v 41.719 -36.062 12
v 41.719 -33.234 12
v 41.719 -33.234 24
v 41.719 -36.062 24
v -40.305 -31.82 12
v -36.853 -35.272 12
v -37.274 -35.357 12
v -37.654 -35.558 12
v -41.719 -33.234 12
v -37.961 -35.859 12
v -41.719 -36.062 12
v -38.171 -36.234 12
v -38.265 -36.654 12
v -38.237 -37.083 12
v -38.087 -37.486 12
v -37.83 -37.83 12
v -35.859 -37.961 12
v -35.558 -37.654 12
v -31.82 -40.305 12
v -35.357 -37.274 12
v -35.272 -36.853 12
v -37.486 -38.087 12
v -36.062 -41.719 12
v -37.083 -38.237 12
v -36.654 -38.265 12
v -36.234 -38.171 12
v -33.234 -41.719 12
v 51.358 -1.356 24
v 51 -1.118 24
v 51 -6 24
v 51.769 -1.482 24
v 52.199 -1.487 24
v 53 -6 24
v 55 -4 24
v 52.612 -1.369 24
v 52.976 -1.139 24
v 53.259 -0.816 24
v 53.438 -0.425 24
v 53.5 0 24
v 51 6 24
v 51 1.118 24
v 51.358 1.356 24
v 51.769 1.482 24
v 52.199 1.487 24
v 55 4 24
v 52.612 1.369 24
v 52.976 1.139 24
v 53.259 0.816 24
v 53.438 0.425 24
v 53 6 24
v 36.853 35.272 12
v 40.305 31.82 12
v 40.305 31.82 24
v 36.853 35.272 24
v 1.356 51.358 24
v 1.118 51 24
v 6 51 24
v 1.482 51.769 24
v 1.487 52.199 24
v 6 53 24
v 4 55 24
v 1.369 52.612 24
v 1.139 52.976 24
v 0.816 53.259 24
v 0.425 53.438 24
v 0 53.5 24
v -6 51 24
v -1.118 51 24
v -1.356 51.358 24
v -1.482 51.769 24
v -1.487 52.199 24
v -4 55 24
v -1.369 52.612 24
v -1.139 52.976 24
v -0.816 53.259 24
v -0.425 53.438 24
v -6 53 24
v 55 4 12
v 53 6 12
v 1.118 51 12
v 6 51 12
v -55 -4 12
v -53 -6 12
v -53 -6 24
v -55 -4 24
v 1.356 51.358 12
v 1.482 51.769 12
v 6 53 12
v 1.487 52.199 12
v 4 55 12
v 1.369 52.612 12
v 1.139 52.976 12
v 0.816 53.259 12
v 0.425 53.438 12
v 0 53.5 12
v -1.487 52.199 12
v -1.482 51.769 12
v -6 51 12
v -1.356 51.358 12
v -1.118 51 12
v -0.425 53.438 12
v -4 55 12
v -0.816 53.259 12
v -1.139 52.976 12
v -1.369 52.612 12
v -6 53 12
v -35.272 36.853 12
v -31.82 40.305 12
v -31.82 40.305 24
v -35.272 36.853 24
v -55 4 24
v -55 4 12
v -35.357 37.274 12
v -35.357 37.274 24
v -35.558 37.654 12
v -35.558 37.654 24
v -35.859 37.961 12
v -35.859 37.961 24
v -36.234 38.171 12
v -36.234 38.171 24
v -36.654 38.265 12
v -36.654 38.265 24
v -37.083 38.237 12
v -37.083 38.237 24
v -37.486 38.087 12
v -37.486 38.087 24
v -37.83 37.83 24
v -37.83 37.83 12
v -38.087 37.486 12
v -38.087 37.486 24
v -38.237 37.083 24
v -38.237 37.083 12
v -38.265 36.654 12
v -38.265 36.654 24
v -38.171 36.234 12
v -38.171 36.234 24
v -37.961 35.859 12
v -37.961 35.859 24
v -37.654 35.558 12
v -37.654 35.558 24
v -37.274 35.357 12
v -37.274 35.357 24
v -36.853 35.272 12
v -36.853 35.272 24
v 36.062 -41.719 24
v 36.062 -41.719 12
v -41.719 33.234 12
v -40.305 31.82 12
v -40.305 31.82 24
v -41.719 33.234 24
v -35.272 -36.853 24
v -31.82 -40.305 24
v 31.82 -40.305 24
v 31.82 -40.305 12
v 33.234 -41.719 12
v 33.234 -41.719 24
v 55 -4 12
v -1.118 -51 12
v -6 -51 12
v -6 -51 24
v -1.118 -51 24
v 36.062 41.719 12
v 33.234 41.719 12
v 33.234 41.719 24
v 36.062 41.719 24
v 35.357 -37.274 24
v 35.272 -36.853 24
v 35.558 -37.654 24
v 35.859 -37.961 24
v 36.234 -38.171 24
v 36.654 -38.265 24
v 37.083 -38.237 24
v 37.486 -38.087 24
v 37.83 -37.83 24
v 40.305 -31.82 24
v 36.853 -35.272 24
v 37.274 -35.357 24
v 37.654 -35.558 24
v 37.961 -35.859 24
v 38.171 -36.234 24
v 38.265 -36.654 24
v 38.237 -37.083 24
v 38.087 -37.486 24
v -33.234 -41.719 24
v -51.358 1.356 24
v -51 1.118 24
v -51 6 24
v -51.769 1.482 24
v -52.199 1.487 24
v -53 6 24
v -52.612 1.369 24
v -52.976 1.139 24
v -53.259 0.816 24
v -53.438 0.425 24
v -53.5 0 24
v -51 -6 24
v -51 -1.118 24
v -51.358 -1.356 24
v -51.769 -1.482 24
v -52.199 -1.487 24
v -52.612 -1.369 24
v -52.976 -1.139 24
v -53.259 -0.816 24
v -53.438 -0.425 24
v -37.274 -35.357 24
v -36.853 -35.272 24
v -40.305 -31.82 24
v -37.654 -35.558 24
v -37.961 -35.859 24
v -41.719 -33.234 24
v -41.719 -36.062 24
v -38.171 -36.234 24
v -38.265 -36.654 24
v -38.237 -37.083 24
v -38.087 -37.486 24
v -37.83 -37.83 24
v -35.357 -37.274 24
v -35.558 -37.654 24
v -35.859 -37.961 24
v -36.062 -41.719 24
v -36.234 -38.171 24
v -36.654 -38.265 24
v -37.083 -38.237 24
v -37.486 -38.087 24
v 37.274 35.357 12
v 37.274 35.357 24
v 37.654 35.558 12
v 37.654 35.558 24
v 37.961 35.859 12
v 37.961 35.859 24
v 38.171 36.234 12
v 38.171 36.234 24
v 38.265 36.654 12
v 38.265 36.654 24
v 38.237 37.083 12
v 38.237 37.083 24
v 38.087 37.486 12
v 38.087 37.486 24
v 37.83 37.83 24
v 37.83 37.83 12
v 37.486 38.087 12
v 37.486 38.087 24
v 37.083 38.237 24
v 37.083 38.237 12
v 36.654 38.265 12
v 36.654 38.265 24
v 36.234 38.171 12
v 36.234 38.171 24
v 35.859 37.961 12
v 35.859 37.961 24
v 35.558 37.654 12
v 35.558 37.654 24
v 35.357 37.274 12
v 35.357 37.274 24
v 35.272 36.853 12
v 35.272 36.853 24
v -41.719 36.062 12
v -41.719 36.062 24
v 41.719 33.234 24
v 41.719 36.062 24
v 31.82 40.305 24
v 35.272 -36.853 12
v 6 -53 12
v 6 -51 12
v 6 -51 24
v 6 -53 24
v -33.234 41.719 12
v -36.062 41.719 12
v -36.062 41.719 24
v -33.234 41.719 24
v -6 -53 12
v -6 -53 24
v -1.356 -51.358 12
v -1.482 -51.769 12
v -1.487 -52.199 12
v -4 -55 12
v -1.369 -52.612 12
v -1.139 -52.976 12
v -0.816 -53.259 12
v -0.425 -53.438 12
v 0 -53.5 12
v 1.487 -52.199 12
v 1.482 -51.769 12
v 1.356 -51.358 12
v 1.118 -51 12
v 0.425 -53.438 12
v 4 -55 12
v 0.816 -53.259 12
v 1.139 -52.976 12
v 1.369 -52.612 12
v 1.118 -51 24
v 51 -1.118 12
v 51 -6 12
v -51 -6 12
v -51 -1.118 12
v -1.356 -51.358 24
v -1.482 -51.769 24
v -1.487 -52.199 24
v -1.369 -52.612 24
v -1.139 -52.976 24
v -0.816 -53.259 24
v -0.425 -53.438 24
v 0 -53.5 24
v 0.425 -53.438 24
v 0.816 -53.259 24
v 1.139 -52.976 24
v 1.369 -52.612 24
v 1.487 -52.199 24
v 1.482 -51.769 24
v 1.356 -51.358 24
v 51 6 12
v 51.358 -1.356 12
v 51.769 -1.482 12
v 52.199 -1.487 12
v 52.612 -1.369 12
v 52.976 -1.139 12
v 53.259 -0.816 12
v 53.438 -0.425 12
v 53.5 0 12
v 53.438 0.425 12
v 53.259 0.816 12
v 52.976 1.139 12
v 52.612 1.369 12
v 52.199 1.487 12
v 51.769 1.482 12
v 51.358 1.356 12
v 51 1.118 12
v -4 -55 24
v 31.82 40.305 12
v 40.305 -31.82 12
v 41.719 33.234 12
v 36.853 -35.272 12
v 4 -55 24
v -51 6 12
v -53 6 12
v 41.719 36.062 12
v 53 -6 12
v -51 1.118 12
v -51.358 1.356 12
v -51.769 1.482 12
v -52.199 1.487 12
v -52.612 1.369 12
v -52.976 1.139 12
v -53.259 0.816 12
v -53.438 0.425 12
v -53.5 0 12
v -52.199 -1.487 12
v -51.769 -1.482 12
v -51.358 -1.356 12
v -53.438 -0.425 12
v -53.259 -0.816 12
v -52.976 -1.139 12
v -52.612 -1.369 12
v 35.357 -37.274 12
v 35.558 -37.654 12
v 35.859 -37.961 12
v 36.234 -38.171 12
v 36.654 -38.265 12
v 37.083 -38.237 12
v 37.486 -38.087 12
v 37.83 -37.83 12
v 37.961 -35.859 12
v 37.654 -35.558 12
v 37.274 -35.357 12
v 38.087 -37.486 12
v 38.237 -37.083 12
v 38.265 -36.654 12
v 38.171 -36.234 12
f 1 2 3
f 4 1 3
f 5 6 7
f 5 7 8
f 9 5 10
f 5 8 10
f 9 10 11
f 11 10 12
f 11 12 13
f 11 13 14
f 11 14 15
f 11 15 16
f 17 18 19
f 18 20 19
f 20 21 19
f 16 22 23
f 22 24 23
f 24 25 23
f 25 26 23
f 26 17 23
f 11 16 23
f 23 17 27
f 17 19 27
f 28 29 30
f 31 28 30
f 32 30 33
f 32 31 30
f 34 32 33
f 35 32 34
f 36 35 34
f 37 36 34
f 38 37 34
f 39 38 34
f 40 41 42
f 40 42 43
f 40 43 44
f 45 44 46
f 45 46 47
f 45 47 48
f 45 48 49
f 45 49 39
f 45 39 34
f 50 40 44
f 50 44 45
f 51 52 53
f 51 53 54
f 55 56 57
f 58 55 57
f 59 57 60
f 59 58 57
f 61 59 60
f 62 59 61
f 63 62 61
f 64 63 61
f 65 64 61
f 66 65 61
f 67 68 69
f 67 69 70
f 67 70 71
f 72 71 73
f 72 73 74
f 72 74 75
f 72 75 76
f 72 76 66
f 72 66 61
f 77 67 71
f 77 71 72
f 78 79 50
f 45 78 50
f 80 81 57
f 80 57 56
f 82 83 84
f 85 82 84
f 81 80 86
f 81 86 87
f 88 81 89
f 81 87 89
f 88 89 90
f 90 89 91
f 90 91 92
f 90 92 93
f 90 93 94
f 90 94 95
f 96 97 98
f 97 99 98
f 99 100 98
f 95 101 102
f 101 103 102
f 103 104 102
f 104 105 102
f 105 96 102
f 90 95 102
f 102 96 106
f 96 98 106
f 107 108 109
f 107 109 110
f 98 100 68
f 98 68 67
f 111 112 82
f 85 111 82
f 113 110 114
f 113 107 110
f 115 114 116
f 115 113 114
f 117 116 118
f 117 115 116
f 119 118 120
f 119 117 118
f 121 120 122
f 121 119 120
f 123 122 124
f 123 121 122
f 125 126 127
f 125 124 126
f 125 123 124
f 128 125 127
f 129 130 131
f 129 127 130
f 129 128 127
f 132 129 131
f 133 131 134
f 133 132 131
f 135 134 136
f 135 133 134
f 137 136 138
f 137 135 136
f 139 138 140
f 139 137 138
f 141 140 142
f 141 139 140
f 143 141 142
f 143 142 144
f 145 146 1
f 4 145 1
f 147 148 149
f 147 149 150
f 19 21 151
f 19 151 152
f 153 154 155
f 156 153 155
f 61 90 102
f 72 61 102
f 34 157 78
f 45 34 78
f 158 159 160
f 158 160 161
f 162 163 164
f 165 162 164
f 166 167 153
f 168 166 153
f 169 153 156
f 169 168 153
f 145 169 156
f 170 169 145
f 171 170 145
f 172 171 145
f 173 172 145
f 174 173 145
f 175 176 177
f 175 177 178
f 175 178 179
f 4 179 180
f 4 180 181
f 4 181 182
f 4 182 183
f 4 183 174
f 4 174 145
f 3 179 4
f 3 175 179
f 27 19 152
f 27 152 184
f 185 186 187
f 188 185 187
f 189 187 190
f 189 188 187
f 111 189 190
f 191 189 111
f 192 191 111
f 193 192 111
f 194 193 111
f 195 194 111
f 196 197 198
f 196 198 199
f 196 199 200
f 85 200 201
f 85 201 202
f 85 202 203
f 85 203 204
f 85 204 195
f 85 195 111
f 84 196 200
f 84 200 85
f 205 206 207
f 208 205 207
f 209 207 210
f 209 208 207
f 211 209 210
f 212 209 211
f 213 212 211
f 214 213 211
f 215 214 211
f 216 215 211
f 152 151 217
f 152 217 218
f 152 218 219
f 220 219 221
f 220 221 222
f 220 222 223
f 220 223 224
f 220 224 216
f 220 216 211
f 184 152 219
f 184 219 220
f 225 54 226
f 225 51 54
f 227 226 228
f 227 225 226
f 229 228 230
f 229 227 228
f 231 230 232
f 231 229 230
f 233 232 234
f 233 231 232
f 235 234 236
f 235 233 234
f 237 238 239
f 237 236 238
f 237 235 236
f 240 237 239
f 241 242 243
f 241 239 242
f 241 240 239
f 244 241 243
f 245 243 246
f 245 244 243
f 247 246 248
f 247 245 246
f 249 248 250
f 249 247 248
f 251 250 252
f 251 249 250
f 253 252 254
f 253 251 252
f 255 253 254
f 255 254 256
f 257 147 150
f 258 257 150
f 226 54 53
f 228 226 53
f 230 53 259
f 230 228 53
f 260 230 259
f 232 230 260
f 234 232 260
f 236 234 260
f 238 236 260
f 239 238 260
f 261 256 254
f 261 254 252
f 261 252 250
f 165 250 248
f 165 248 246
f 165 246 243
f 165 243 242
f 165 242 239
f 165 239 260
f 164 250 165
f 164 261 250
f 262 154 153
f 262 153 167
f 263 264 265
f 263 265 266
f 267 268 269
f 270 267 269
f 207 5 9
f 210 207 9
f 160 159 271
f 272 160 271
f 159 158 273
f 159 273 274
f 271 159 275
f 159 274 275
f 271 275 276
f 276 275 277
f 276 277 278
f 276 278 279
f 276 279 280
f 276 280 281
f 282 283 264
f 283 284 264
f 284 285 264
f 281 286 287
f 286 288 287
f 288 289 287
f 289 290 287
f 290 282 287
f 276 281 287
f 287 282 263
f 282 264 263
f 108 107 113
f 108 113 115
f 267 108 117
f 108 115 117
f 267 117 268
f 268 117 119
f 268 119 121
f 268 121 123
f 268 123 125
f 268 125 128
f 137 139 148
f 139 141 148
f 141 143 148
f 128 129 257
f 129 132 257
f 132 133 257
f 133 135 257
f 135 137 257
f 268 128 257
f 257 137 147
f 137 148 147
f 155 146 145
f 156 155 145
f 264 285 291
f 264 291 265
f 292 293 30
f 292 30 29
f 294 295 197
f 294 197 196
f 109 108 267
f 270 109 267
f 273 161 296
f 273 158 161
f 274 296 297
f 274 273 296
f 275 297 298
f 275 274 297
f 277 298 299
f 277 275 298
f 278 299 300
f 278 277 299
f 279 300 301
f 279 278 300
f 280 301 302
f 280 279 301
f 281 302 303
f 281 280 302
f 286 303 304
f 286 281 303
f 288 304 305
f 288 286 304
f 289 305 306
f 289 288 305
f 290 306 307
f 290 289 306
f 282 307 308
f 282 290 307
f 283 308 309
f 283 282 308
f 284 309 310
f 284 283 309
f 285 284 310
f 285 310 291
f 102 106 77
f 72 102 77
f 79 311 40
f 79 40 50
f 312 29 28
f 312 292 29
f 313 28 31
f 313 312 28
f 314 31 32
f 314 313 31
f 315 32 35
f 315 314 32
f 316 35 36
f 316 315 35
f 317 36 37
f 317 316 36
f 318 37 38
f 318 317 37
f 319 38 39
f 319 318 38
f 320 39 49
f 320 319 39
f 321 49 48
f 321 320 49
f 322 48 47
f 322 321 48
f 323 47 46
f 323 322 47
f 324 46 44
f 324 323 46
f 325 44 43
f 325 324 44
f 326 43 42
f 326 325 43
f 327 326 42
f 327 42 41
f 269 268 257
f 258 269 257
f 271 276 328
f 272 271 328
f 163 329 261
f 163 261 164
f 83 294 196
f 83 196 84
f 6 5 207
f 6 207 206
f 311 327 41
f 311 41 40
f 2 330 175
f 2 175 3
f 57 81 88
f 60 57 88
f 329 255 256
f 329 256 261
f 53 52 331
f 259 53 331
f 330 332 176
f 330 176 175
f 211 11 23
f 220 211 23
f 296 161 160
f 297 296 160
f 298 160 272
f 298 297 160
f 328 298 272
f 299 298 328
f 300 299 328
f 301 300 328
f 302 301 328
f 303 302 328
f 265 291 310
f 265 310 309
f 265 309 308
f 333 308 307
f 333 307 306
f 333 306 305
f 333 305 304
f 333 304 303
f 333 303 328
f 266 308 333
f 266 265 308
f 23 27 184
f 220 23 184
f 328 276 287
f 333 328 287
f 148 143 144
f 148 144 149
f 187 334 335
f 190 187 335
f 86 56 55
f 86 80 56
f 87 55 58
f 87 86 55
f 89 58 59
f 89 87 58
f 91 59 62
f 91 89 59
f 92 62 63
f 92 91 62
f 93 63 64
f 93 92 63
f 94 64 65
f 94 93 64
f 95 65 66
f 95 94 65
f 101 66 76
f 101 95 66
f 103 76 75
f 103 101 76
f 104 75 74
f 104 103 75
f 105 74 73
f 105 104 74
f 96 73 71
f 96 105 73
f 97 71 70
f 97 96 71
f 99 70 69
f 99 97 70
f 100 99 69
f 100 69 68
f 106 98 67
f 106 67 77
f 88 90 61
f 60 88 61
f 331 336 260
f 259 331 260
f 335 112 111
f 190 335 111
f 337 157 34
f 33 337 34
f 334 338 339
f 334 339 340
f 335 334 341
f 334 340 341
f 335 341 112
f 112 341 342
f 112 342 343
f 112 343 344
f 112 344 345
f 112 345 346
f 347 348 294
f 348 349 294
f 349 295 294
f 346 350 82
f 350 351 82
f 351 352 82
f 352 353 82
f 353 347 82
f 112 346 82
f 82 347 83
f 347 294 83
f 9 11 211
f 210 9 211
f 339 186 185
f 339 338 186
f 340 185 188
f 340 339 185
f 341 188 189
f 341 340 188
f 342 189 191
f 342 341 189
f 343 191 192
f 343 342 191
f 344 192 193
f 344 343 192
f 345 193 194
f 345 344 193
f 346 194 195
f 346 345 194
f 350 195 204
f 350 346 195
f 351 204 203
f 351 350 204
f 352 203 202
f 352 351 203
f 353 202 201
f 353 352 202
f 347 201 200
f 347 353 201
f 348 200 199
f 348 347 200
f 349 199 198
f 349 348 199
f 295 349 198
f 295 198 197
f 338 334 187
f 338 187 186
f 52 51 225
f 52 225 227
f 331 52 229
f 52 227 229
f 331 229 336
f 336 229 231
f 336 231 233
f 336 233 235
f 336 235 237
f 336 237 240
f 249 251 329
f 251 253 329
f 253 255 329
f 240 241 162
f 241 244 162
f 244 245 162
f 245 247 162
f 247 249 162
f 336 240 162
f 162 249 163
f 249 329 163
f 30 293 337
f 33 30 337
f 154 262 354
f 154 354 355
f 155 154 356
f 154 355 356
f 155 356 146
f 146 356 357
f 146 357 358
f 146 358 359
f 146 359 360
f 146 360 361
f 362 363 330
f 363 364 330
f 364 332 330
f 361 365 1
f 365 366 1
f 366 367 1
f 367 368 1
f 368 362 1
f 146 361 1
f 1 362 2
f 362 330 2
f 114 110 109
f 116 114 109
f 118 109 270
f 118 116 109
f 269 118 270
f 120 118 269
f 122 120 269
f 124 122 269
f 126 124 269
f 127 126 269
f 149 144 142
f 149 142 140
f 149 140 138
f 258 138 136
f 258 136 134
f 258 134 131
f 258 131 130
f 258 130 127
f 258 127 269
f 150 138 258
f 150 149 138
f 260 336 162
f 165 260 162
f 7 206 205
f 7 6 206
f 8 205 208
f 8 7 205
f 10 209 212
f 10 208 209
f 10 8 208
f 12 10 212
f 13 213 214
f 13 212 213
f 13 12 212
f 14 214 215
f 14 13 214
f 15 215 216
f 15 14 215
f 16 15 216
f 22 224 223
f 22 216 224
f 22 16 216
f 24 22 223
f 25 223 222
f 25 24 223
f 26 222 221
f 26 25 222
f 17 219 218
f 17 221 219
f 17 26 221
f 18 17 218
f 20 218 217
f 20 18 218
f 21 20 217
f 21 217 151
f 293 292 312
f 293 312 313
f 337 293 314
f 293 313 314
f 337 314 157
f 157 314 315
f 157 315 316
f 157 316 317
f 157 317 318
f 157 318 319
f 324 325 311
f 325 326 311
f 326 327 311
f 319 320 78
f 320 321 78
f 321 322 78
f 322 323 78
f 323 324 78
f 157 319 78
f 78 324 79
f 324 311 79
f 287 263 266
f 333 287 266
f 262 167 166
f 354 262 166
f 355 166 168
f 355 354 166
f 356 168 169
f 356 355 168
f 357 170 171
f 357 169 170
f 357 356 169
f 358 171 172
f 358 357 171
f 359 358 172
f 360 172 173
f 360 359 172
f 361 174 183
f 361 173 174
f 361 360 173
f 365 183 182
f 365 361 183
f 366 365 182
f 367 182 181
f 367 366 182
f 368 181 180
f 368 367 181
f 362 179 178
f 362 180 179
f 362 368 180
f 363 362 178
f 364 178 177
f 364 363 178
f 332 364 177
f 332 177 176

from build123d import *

# Parameters (mm, degrees)
CYLINDER1215_R               = 1.5
CYLINDER1215_DEPTH           = 50
CYLINDER1215_PLACEMENT_ANGLE = 45
CYLINDER1213_R               = 1.5
CYLINDER1213_DEPTH           = 50
CYLINDER1220_R               = 1.5
CYLINDER1220_DEPTH           = 50
CYLINDER1220_PLACEMENT_ANGLE = 135
CYLINDER1216_R               = 1.5
CYLINDER1216_DEPTH           = 50
CYLINDER1217_R               = 1.5
CYLINDER1217_DEPTH           = 50
CYLINDER1217_PLACEMENT_ANGLE = 225
CYLINDER1218_R               = 1.5
CYLINDER1218_DEPTH           = 50
CYLINDER1219_R               = 1.5
CYLINDER1219_DEPTH           = 50
CYLINDER1219_PLACEMENT_ANGLE = 45
CYLINDER1214_R               = 1.5
CYLINDER1214_DEPTH           = 50
BOX511_W                     = 4
BOX511_H                     = 12
BOX511_DEPTH                 = 12
CHAMFER018_SIZE              = 2
CHAMFER018_PLACEMENT_ANGLE   = 45
CHAMFER019_SIZE              = 2
CHAMFER019_PLACEMENT_ANGLE   = 90
CHAMFER020_SIZE              = 2
CHAMFER020_PLACEMENT_ANGLE   = 135
CHAMFER021_SIZE              = 2
CHAMFER021_PLACEMENT_ANGLE   = 180
CHAMFER022_SIZE              = 2
CHAMFER022_PLACEMENT_ANGLE   = 225
CHAMFER023_SIZE              = 2
CHAMFER023_PLACEMENT_ANGLE   = 90
CHAMFER024_SIZE              = 2
CHAMFER024_PLACEMENT_ANGLE   = 45
CHAMFER017_SIZE              = 2


with BuildPart() as v_lec1215:
    # Cylinder1215 → Cylinder1215 (new body)
    with BuildSketch(Plane.XY):
        Circle(CYLINDER1215_R)
    extrude(amount=CYLINDER1215_DEPTH)


with BuildPart() as v_lec1215_1:
    # Cylinder1215 placement: moved
    add(v_lec1215.part.moved(Location((36.769553, 36.769553, 0))).rotate(Axis((36.769553, 36.769553, 0), (0, 0, 1)), CYLINDER1215_PLACEMENT_ANGLE))


with BuildPart() as v_lec1213:
    # Cylinder1213 → Cylinder1213 (new body)
    with BuildSketch(Plane(origin=(0, 52, 0), x_dir=(0, 1, 0), z_dir=(0, 0, 1))):
        Circle(CYLINDER1213_R)
    extrude(amount=CYLINDER1213_DEPTH)


with BuildPart() as v_lec1220:
    # Cylinder1220 → Cylinder1220 (new body)
    with BuildSketch(Plane.XY):
        Circle(CYLINDER1220_R)
    extrude(amount=CYLINDER1220_DEPTH)


with BuildPart() as v_lec1220_1:
    # Cylinder1220 placement: moved
    add(v_lec1220.part.moved(Location((-36.769553, 36.769553, 0))).rotate(Axis((-36.769553, 36.769553, 0), (0, 0, 1)), CYLINDER1220_PLACEMENT_ANGLE))


with BuildPart() as v_lec1216:
    # Cylinder1216 → Cylinder1216 (new body)
    with BuildSketch(Plane(origin=(-52, 0, 0), x_dir=(-1, 0, 0), z_dir=(0, 0, 1))):
        Circle(CYLINDER1216_R)
    extrude(amount=CYLINDER1216_DEPTH)


with BuildPart() as v_lec1217:
    # Cylinder1217 → Cylinder1217 (new body)
    with BuildSketch(Plane.XY):
        Circle(CYLINDER1217_R)
    extrude(amount=CYLINDER1217_DEPTH)


with BuildPart() as v_lec1217_1:
    # Cylinder1217 placement: moved
    add(v_lec1217.part.moved(Location((-36.769553, -36.769553, 0))).rotate(Axis((-36.769553, -36.769553, 0), (0, 0, 1)), CYLINDER1217_PLACEMENT_ANGLE))


with BuildPart() as v_lec1218:
    # Cylinder1218 → Cylinder1218 (new body)
    with BuildSketch(Plane(origin=(0, -52, 0), x_dir=(0, -1, 0), z_dir=(0, 0, 1))):
        Circle(CYLINDER1218_R)
    extrude(amount=CYLINDER1218_DEPTH)


with BuildPart() as v_lec1219:
    # Cylinder1219 → Cylinder1219 (new body)
    with BuildSketch(Plane.XY):
        Circle(CYLINDER1219_R)
    extrude(amount=CYLINDER1219_DEPTH)


with BuildPart() as v_lec1219_1:
    # Cylinder1219 placement: moved
    add(v_lec1219.part.moved(Location((36.769553, -36.769553, 0))).rotate(Axis((36.769553, -36.769553, 0), (0, 0, -1)), CYLINDER1219_PLACEMENT_ANGLE))


with BuildPart() as compound899:
    # Cylinder1214 → Cylinder1214 (new body)
    with BuildSketch(Plane(origin=(52, 0, 0), x_dir=(1, 0, 0), z_dir=(0, 0, 1))):
        Circle(CYLINDER1214_R)
    extrude(amount=CYLINDER1214_DEPTH)

    # Compound899: union Válec1215, Válec1213, Válec1220, Válec1216, Válec1217, Válec1218, Válec1219
    add(v_lec1215_1.part)
    add(v_lec1213.part)
    add(v_lec1220_1.part)
    add(v_lec1216.part)
    add(v_lec1217_1.part)
    add(v_lec1218.part)
    add(v_lec1219_1.part)


with BuildPart() as compound899_1:
    # Compound899 placement: moved
    add(compound899.part.moved(Location((0, 0, -7))))


with BuildPart() as krychle511:
    # Box511 → Box511 (new body)
    with BuildSketch(Plane(origin=(51, -6, 12), x_dir=(1, 0, 0), z_dir=(0, 0, 1))):
        with Locations((2, 6)):
            Rectangle(BOX511_W, BOX511_H)
    extrude(amount=BOX511_DEPTH)


with BuildPart() as chamfer018:
    # Chamfer018 base: copy of Krychle511
    add(krychle511.part)

    # Chamfer018
    chamfer018_edges = [chamfer018.edges().sort_by_distance(p)[0] for p in [
        (55, -6, 18),
        (55, 6, 18),
    ]]
    chamfer(chamfer018_edges, length=CHAMFER018_SIZE)


with BuildPart() as chamfer018_1:
    # Chamfer018 placement: moved
    add(chamfer018.part.rotate(Axis((0, 0, 0), (0, 0, 1)), CHAMFER018_PLACEMENT_ANGLE))


with BuildPart() as chamfer019:
    # Chamfer019 base: copy of Krychle511
    add(krychle511.part)

    # Chamfer019
    chamfer019_edges = [chamfer019.edges().sort_by_distance(p)[0] for p in [
        (55, -6, 18),
        (55, 6, 18),
    ]]
    chamfer(chamfer019_edges, length=CHAMFER019_SIZE)


with BuildPart() as chamfer019_1:
    # Chamfer019 placement: moved
    add(chamfer019.part.rotate(Axis((0, 0, 0), (0, 0, 1)), CHAMFER019_PLACEMENT_ANGLE))


with BuildPart() as chamfer020:
    # Chamfer020 base: copy of Krychle511
    add(krychle511.part)

    # Chamfer020
    chamfer020_edges = [chamfer020.edges().sort_by_distance(p)[0] for p in [
        (55, -6, 18),
        (55, 6, 18),
    ]]
    chamfer(chamfer020_edges, length=CHAMFER020_SIZE)


with BuildPart() as chamfer020_1:
    # Chamfer020 placement: moved
    add(chamfer020.part.rotate(Axis((0, 0, 0), (0, 0, 1)), CHAMFER020_PLACEMENT_ANGLE))


with BuildPart() as chamfer021:
    # Chamfer021 base: copy of Krychle511
    add(krychle511.part)

    # Chamfer021
    chamfer021_edges = [chamfer021.edges().sort_by_distance(p)[0] for p in [
        (55, -6, 18),
        (55, 6, 18),
    ]]
    chamfer(chamfer021_edges, length=CHAMFER021_SIZE)


with BuildPart() as chamfer021_1:
    # Chamfer021 placement: moved
    add(chamfer021.part.rotate(Axis((0, 0, 0), (0, 0, 1)), CHAMFER021_PLACEMENT_ANGLE))


with BuildPart() as chamfer022:
    # Chamfer022 base: copy of Krychle511
    add(krychle511.part)

    # Chamfer022
    chamfer022_edges = [chamfer022.edges().sort_by_distance(p)[0] for p in [
        (55, -6, 18),
        (55, 6, 18),
    ]]
    chamfer(chamfer022_edges, length=CHAMFER022_SIZE)


with BuildPart() as chamfer022_1:
    # Chamfer022 placement: moved
    add(chamfer022.part.rotate(Axis((0, 0, 0), (0, 0, 1)), CHAMFER022_PLACEMENT_ANGLE))


with BuildPart() as chamfer023:
    # Chamfer023 base: copy of Krychle511
    add(krychle511.part)

    # Chamfer023
    chamfer023_edges = [chamfer023.edges().sort_by_distance(p)[0] for p in [
        (55, -6, 18),
        (55, 6, 18),
    ]]
    chamfer(chamfer023_edges, length=CHAMFER023_SIZE)


with BuildPart() as chamfer023_1:
    # Chamfer023 placement: moved
    add(chamfer023.part.rotate(Axis((0, 0, 0), (0, 0, -1)), CHAMFER023_PLACEMENT_ANGLE))


with BuildPart() as chamfer024:
    # Chamfer024 base: copy of Krychle511
    add(krychle511.part)

    # Chamfer024
    chamfer024_edges = [chamfer024.edges().sort_by_distance(p)[0] for p in [
        (55, -6, 18),
        (55, 6, 18),
    ]]
    chamfer(chamfer024_edges, length=CHAMFER024_SIZE)


with BuildPart() as chamfer024_1:
    # Chamfer024 placement: moved
    add(chamfer024.part.rotate(Axis((0, 0, 0), (0, 0, -1)), CHAMFER024_PLACEMENT_ANGLE))


with BuildPart() as cut449:
    # Chamfer017 base: copy of Krychle511
    add(krychle511.part)

    # Chamfer017
    chamfer017_edges = [cut449.edges().sort_by_distance(p)[0] for p in [
        (55, -6, 18),
        (55, 6, 18),
    ]]
    chamfer(chamfer017_edges, length=CHAMFER017_SIZE)

    # Compound901: union Chamfer018, Chamfer019, Chamfer020, Chamfer021, Chamfer022, Chamfer023, Chamfer024
    add(chamfer018_1.part)
    add(chamfer019_1.part)
    add(chamfer020_1.part)
    add(chamfer021_1.part)
    add(chamfer022_1.part)
    add(chamfer023_1.part)
    add(chamfer024_1.part)

    # Cut449: cut Compound899
    add(compound899_1.part, mode=Mode.SUBTRACT)


solid = cut449.part
